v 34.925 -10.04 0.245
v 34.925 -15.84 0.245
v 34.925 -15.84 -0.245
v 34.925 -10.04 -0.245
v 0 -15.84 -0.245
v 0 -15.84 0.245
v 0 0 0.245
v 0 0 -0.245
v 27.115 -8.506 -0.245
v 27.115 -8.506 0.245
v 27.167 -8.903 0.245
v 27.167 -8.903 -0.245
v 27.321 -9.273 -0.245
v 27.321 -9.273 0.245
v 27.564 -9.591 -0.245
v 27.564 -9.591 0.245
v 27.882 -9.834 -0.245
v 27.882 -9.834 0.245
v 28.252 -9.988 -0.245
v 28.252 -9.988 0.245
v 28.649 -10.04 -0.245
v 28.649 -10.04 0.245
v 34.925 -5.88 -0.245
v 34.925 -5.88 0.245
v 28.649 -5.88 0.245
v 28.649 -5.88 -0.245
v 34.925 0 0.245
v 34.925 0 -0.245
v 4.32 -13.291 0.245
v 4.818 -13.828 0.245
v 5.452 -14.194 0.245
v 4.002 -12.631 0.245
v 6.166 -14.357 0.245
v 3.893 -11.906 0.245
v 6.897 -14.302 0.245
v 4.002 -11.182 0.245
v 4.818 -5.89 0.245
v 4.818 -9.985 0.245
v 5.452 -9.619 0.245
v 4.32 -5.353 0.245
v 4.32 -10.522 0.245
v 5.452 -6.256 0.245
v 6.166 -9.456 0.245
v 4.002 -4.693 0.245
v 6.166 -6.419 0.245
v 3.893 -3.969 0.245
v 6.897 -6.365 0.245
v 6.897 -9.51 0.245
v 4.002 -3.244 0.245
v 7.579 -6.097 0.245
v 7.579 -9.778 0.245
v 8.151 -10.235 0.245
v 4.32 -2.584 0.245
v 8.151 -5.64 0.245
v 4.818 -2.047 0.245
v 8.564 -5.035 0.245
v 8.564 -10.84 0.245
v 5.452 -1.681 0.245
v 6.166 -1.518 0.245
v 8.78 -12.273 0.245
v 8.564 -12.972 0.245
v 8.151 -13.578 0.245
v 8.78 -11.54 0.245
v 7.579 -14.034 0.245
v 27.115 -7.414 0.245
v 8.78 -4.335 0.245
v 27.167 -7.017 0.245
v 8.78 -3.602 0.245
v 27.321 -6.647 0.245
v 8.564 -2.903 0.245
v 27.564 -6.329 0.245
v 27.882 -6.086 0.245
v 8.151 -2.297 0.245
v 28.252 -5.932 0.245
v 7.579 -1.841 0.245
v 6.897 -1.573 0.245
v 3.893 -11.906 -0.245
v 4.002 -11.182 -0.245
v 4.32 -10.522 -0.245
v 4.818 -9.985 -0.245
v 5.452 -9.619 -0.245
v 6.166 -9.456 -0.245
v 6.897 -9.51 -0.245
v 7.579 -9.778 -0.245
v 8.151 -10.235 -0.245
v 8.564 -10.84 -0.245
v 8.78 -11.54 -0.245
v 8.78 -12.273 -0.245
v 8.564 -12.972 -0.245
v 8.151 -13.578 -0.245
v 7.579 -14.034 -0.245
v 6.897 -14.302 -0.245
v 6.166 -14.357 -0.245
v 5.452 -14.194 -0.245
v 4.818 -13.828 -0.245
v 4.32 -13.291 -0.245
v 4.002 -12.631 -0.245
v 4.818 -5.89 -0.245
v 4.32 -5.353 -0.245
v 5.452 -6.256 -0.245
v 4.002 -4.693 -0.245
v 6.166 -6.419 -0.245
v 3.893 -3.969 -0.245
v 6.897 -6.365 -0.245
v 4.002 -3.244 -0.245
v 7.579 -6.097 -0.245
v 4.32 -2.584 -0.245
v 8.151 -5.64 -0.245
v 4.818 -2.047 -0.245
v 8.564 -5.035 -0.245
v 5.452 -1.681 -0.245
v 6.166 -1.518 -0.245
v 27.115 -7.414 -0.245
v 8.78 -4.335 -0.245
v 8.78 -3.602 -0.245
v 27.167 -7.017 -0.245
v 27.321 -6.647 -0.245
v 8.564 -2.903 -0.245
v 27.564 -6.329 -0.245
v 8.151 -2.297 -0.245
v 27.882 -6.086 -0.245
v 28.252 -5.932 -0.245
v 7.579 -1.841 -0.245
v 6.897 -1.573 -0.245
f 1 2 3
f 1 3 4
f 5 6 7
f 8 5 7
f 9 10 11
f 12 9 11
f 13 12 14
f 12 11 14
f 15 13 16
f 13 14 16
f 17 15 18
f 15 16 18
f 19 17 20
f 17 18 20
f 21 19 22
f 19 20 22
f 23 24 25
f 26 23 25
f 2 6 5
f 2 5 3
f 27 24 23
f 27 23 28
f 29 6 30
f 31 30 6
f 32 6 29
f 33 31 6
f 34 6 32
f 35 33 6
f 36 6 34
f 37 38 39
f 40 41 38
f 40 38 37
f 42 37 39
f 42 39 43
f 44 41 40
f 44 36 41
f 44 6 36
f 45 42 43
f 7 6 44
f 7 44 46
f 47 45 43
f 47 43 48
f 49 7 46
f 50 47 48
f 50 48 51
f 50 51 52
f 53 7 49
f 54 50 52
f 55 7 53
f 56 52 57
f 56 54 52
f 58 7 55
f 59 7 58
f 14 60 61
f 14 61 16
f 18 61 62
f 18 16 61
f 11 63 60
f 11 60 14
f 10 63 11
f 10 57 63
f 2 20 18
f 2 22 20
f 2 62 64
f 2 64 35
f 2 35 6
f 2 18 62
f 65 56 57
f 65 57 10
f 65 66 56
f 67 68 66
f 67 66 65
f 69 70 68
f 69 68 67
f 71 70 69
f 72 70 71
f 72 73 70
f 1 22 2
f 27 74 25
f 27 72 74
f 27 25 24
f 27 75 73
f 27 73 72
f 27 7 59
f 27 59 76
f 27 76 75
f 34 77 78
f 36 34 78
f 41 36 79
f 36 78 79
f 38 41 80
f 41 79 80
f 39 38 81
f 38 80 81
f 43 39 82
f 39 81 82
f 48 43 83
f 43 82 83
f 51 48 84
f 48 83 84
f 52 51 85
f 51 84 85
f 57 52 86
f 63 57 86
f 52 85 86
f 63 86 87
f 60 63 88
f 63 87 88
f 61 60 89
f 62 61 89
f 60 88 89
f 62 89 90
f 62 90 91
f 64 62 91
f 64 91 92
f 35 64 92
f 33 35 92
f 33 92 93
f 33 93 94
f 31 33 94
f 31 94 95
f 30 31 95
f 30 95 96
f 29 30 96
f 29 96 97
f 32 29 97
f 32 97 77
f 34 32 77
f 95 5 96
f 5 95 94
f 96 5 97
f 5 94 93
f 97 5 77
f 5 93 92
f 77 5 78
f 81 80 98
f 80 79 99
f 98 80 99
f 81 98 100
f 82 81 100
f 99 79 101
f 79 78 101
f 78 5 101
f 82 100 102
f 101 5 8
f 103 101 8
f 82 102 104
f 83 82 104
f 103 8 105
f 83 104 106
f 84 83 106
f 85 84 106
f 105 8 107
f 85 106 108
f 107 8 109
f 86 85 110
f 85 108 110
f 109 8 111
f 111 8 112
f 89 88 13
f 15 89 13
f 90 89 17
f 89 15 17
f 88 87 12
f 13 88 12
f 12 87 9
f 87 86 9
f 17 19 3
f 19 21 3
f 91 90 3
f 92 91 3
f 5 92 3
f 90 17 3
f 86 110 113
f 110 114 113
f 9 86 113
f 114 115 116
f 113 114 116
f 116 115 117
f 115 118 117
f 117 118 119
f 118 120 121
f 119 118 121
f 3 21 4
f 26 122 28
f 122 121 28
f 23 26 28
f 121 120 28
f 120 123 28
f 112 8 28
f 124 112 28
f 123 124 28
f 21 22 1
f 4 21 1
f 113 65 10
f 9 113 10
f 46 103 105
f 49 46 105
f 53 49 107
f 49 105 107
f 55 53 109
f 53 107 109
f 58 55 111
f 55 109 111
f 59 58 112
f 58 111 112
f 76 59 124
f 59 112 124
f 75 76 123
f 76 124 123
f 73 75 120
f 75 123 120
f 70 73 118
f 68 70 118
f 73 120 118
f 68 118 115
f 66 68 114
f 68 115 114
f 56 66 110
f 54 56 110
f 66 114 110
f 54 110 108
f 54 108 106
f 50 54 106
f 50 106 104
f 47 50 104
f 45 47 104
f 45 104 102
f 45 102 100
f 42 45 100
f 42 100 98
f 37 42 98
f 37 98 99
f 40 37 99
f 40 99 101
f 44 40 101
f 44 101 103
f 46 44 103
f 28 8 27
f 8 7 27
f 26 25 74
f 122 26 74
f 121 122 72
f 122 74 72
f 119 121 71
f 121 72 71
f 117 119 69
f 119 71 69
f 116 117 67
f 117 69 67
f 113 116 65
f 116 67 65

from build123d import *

# Parameters (mm, degrees)
SKETCH1_W             = 34.925
SKETCH1_H             = 15.84
BOSS_EXTRUDE1_DEPTH   = 0.245
CUT_EXTRUDE1_DEPTH    = 39.352331415
F_8_CLEARANCE_HOLE1_D = 4.9149


with BuildPart() as part:
    # Sketch1 → Boss-Extrude1 (new, symmetric)
    with BuildSketch(Plane.XY):
        with Locations((17.4625, -7.92)):
            Rectangle(SKETCH1_W, SKETCH1_H)
    extrude(amount=BOSS_EXTRUDE1_DEPTH, both=True)

    # Sketch2 → Cut-Extrude1 (cut, through all)
    with BuildSketch(Plane.XY.offset(0.245)):
        with BuildLine():
            Line((34.925, -5.88), (28.649421715, -5.88))
            ThreePointArc((28.649421715, -5.88), (27.564421715, -6.329421715), (27.115, -7.414421715))
            Line((27.115, -7.414421715), (27.115, -8.505578285))
            ThreePointArc((27.115, -8.505578285), (27.564421715, -9.590578285), (28.649421715, -10.04))
            Line((28.649421715, -10.04), (34.925, -10.04))
            Line((34.925, -10.04), (34.925, -5.88))
        make_face()
    extrude(amount=-CUT_EXTRUDE1_DEPTH, mode=Mode.SUBTRACT)

    # #8 Clearance Hole1 (through all)
    with Locations(Plane.XY.offset(0.245)):
        with Locations((6.35, -3.96875), (6.35, -11.90625)):
            Hole(F_8_CLEARANCE_HOLE1_D / 2)


solid = part.part
